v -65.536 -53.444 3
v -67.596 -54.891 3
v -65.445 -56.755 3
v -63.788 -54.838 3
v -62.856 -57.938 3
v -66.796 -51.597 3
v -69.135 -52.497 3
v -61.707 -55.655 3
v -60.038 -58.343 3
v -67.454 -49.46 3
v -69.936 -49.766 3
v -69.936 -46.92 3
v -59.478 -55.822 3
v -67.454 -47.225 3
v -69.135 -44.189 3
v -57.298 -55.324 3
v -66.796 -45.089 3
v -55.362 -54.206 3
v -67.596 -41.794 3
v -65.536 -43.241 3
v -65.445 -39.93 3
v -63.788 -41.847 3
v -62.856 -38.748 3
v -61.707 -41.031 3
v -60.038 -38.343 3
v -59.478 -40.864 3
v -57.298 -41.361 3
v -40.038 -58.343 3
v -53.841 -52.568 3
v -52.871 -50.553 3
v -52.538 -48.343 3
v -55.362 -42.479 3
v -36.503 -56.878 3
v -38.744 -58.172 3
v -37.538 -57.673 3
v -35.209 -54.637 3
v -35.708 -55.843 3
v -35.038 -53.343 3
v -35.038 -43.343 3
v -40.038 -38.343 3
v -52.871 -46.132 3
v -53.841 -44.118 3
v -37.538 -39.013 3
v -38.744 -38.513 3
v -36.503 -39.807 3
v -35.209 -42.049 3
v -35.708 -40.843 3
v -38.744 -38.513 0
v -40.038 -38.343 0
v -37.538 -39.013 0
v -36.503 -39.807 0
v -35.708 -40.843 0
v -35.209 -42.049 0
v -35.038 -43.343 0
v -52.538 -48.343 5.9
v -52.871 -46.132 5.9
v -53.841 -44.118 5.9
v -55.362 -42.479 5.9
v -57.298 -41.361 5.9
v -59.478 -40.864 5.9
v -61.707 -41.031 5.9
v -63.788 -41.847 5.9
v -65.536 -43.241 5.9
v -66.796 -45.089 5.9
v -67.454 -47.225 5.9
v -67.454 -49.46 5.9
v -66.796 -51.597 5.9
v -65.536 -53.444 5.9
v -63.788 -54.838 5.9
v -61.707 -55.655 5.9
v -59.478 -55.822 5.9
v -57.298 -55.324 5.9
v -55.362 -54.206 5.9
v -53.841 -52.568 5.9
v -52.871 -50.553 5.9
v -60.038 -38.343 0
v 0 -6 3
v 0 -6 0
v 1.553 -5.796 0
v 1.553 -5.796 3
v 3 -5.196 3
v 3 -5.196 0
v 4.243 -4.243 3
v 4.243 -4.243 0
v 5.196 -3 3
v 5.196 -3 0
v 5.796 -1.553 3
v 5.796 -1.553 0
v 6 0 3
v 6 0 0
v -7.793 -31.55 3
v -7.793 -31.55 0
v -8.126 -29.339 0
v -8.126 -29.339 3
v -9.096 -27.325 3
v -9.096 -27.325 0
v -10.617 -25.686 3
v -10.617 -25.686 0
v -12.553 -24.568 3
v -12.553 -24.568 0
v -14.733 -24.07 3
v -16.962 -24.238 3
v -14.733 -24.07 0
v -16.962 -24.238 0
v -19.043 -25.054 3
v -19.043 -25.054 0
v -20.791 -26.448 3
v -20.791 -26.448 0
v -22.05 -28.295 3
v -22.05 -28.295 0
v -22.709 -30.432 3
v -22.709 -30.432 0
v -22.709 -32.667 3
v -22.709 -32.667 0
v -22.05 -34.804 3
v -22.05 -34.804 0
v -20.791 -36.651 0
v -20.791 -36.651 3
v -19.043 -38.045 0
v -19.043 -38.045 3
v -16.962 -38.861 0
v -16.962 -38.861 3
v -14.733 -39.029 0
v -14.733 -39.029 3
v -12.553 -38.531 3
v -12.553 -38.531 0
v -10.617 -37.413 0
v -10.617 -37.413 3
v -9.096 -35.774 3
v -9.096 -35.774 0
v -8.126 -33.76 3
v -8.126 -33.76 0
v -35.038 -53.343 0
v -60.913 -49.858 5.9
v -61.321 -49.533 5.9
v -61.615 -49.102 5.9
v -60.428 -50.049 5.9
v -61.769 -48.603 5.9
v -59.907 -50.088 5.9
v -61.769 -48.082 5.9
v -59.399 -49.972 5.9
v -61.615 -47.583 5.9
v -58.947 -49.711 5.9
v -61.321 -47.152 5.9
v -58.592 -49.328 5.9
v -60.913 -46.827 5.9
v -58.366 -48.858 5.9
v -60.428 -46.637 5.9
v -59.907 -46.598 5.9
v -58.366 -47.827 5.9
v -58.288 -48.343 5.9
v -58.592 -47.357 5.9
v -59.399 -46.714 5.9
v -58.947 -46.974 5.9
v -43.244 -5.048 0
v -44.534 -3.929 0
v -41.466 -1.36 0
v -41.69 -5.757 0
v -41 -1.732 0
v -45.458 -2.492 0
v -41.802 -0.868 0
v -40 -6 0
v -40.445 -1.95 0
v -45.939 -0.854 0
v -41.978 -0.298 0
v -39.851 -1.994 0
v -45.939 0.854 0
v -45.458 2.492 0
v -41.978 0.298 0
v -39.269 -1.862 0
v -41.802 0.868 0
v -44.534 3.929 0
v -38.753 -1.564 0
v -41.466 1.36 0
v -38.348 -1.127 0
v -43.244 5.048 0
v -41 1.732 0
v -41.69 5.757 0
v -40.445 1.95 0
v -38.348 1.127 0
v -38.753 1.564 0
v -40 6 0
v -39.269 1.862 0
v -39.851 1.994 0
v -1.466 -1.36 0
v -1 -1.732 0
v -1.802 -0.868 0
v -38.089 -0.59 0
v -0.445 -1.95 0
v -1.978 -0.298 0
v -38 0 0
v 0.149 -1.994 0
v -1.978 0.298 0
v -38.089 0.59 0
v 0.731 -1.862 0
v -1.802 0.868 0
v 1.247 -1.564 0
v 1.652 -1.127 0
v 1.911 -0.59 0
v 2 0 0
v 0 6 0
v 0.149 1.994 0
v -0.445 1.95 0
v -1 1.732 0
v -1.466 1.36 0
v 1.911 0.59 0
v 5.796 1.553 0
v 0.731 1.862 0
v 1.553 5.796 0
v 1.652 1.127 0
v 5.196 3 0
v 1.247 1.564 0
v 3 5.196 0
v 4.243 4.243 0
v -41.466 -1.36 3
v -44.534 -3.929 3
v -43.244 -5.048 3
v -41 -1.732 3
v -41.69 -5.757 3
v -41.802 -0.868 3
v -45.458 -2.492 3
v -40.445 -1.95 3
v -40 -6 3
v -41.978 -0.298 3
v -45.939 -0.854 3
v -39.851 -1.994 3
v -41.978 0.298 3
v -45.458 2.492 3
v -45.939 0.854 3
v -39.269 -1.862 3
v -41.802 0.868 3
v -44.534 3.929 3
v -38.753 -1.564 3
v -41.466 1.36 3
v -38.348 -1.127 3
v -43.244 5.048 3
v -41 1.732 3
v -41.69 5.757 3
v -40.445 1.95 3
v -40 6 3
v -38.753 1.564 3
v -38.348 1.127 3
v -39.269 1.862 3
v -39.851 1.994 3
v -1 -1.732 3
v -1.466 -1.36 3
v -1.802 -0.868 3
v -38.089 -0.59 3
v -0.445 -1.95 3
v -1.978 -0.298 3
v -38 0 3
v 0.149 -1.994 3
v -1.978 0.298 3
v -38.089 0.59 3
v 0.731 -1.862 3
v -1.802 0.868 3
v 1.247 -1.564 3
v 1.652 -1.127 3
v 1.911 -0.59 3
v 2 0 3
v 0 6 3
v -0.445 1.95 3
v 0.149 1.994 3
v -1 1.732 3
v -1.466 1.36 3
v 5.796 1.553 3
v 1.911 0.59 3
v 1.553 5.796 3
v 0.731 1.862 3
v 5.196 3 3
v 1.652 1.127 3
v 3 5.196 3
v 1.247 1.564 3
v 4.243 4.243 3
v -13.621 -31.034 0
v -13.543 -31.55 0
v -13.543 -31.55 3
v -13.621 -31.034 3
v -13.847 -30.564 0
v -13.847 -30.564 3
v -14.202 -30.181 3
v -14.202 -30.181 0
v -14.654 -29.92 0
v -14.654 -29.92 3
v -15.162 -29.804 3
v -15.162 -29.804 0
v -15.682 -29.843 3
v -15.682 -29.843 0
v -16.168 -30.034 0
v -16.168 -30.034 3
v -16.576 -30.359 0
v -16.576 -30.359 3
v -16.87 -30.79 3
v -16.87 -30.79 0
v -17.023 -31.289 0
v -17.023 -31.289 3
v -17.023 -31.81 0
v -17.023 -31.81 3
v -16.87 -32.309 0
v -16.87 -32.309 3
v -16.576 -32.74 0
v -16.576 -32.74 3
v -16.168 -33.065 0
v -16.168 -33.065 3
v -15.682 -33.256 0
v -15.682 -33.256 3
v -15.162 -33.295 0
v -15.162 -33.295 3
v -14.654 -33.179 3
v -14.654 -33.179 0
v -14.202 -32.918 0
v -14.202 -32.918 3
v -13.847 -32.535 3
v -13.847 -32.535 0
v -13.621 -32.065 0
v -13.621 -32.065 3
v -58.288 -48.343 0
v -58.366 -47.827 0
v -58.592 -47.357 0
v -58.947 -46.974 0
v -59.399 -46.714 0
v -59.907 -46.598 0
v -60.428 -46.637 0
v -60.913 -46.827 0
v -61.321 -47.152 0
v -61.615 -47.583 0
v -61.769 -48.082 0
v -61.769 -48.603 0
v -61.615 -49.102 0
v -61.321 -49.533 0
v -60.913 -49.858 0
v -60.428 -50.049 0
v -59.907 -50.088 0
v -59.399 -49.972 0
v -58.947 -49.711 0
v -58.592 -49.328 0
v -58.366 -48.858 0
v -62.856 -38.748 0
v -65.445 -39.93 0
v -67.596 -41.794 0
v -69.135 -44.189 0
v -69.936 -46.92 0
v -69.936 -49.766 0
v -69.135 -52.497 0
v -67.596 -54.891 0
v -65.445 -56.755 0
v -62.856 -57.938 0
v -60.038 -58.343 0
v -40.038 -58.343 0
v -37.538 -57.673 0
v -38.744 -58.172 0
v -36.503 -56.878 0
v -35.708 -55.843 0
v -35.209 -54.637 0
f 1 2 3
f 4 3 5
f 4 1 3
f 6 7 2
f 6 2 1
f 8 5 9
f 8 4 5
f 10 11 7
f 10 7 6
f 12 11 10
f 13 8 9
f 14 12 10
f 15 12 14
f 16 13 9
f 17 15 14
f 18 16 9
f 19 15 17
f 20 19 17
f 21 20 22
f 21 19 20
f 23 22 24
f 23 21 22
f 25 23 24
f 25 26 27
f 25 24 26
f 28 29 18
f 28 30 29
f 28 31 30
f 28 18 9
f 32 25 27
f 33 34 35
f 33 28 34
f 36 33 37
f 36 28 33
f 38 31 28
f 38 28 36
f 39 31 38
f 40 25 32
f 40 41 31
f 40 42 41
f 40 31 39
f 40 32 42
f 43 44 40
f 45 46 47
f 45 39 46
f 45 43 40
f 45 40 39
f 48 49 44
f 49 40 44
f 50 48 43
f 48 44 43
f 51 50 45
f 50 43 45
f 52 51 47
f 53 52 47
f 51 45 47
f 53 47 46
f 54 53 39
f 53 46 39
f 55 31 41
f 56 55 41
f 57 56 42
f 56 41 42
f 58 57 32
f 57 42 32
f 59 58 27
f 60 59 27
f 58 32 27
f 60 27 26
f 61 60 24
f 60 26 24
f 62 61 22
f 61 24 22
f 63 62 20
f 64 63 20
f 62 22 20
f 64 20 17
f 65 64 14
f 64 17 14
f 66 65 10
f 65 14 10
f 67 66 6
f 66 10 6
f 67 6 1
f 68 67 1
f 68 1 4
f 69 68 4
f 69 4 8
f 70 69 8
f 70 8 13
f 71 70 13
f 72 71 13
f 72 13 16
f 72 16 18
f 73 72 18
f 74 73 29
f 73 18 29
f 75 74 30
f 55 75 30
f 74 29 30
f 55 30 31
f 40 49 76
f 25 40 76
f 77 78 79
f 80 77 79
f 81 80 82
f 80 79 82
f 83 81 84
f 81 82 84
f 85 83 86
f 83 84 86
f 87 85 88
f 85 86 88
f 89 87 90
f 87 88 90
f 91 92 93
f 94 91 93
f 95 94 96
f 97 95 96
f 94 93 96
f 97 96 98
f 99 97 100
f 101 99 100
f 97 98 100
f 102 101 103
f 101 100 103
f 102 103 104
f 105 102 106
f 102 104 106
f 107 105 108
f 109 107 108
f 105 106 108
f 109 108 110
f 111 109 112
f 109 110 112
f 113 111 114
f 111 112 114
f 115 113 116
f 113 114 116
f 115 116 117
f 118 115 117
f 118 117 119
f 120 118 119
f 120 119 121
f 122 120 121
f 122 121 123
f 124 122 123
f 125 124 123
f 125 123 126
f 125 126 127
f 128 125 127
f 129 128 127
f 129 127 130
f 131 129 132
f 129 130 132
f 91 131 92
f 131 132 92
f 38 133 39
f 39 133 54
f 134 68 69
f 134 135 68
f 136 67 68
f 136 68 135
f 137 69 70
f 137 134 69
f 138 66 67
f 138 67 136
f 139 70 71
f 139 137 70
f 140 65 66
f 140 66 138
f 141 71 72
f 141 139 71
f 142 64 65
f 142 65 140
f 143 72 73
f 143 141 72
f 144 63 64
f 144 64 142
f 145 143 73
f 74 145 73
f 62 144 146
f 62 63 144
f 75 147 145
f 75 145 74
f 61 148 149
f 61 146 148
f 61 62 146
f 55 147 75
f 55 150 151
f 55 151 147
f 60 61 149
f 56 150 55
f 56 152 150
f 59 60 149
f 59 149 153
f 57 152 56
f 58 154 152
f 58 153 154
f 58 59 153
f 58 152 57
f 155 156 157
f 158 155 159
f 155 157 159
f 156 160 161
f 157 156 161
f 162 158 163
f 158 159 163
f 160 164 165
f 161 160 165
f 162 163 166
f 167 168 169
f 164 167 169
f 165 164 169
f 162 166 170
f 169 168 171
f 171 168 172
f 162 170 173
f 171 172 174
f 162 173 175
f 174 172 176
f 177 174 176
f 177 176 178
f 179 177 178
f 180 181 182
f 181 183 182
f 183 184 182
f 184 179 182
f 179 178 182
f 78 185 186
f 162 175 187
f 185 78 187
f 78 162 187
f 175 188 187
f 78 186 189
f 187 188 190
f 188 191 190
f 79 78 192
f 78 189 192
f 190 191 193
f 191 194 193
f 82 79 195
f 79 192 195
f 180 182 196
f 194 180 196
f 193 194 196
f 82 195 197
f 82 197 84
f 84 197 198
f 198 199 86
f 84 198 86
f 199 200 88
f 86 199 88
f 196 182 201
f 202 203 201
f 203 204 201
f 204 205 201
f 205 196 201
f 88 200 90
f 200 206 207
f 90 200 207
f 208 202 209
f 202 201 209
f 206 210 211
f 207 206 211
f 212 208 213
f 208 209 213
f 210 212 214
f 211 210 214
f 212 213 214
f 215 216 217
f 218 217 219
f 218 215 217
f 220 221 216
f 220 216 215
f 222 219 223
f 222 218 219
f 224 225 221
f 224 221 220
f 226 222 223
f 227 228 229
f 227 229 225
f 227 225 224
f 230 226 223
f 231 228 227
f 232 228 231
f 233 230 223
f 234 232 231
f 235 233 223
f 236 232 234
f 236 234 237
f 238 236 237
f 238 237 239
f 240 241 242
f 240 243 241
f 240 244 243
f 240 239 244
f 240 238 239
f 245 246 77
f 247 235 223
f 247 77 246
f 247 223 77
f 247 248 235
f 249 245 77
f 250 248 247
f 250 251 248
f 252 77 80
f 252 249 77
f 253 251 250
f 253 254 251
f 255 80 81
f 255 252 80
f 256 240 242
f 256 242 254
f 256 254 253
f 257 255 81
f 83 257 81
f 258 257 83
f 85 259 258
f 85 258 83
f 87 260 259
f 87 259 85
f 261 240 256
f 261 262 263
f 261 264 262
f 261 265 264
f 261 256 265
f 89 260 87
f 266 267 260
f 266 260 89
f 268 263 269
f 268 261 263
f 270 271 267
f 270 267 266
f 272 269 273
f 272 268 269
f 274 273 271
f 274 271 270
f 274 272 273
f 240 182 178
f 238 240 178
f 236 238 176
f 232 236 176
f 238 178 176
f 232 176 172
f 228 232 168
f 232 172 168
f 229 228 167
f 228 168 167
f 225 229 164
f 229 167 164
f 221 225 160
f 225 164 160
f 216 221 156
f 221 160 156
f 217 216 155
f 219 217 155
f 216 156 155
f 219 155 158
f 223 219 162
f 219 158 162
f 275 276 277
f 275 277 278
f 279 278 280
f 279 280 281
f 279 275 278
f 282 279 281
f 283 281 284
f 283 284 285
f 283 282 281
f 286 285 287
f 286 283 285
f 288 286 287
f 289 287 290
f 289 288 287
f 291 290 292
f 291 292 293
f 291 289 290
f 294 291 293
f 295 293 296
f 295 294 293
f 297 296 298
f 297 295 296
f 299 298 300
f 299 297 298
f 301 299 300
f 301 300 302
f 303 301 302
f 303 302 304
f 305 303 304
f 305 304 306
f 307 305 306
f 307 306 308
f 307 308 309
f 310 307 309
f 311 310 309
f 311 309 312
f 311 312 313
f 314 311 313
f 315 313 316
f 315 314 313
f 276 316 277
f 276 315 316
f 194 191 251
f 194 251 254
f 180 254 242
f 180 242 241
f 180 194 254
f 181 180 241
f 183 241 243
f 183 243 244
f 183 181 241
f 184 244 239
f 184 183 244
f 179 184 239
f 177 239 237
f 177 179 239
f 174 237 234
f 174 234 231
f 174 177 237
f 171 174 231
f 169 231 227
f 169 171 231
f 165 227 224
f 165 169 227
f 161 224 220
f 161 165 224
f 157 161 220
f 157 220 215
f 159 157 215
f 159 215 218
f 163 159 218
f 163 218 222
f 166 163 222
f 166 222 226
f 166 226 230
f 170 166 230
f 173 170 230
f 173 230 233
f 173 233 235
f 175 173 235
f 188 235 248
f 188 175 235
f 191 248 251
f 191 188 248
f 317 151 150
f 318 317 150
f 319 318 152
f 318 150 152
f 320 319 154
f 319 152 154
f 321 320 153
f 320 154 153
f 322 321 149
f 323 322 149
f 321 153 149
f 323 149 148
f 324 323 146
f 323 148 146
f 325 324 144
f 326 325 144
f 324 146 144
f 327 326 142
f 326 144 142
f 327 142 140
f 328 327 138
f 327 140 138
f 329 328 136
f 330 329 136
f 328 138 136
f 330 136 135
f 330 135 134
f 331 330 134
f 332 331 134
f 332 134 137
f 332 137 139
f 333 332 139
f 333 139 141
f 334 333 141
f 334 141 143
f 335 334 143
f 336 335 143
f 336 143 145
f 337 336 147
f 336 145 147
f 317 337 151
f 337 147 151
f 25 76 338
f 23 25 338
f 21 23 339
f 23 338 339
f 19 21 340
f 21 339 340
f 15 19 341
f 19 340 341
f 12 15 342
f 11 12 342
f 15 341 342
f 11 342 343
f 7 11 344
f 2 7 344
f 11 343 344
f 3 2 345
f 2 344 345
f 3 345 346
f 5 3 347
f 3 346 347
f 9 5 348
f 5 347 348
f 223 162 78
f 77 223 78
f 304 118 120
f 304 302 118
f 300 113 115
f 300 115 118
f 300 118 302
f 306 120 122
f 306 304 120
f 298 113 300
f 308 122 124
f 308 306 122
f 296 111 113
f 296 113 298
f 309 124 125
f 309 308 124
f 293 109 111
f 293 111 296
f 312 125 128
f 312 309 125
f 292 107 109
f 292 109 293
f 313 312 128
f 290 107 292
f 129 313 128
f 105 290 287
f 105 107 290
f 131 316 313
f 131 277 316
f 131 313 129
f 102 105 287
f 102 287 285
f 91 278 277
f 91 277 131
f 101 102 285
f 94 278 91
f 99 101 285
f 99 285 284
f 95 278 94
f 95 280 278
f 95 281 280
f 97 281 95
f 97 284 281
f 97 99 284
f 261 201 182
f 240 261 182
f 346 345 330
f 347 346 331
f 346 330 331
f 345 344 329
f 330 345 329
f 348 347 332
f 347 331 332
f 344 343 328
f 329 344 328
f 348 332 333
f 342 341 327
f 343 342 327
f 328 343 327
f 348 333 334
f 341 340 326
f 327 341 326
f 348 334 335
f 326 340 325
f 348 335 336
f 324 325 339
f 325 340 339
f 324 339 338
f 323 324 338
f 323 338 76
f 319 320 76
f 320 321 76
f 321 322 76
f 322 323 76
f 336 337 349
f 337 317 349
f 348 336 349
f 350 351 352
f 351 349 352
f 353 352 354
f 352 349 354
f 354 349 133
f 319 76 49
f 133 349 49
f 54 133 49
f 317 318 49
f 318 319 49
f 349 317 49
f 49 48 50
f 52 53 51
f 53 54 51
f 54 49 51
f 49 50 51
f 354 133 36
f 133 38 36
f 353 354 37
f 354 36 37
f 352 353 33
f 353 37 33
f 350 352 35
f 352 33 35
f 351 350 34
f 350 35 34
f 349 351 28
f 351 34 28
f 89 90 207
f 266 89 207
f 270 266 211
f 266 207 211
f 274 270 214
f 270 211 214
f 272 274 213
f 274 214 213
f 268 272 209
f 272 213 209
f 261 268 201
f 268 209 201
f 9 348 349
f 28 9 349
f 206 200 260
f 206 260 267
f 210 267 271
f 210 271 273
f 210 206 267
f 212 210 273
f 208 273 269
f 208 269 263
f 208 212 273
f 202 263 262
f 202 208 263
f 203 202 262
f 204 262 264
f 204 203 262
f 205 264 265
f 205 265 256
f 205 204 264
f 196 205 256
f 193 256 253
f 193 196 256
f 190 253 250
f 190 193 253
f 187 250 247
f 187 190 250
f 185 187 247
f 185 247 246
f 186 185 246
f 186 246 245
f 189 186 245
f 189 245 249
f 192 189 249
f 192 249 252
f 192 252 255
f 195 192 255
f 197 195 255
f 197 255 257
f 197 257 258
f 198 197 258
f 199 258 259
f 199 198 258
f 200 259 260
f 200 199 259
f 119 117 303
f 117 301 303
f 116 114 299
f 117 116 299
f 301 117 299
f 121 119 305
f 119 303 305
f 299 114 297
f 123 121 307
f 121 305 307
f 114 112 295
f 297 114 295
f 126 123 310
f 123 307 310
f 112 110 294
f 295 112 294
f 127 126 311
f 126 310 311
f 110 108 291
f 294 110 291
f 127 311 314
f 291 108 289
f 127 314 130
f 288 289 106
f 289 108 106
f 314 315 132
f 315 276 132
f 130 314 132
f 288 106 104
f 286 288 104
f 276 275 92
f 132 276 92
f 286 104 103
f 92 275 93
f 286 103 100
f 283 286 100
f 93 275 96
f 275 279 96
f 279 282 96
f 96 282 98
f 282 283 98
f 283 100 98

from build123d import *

# Parameters (mm, degrees)
F0_R     = 2
F1_DEPTH = 3
F3_DEPTH = 3
F4_R     = 7.5
F5_DEPTH = 2.9
F6_R     = 1.75
F7_DEPTH = 5.9
F8_R     = 7.5
F8_R_2   = 1.75
F9_DEPTH = 3
F10_R    = 5


with BuildPart() as f1:
    # F0 (on Top) → F1 (new body)
    with BuildSketch(Plane.XY):
        with BuildLine():
            ThreePointArc((0, -6), (4.2426406871, -4.2426406871), (6, 0))
            ThreePointArc((6, 0), (4.2426406871, 4.2426406871), (0, 6))
            ThreePointArc((0, 6), (-6, 0), (0, -6))
        make_face()
        Circle(F0_R, mode=Mode.SUBTRACT)
        with BuildLine():
            ThreePointArc((0, -6), (-6, 0), (0, 6))
            Line((0, 6), (-40, 6))
            ThreePointArc((-40, 6), (-35.7573593129, 4.2426406871), (-34, 0))
            ThreePointArc((-34, 0), (-35.7573593129, -4.2426406871), (-40, -6))
            Line((-40, -6), (0, -6))
        make_face()
        with BuildLine():
            ThreePointArc((-34, 0), (-35.7573593129, 4.2426406871), (-40, 6))
            ThreePointArc((-40, 6), (-46, 0), (-40, -6))
            ThreePointArc((-40, -6), (-35.7573593129, -4.2426406871), (-34, 0))
        make_face()
        with Locations((-40, 0)):
            Circle(F0_R, mode=Mode.SUBTRACT)
    extrude(amount=F1_DEPTH)


with BuildPart() as f3:
    # F2 (on Top) → F3 (new body)
    with BuildSketch(Plane.XY):
        with BuildLine():
            Line((-35.0382344763, -38.3426717669), (-60.0382344763, -38.3426717669))
            ThreePointArc((-60.0382344763, -38.3426717669), (-70.0382344763, -48.3426717669), (-60.0382344763, -58.3426717669))
            Line((-60.0382344763, -58.3426717669), (-35.0382344763, -58.3426717669))
            Line((-35.0382344763, -58.3426717669), (-35.0382344763, -38.3426717669))
        make_face()
    extrude(amount=F3_DEPTH)

    # F4 (on face) → F5 (join)
    with BuildSketch(Plane.XY.offset(3)):
        with Locations((-60.0382344763, -48.3426717669)):
            Circle(F4_R)
    extrude(amount=F5_DEPTH)

    # F6 (on face) → F7 (cut, through all)
    with BuildSketch(Plane.XY.offset(5.9)):
        with Locations((-60.0382344763, -48.3426717669)):
            Circle(F6_R)
    extrude(amount=-F7_DEPTH, mode=Mode.SUBTRACT)

    # F10
    f10_edges = [f3.edges().sort_by_distance(p)[0] for p in [
        (-35.038234, -38.342672, 1.5),
        (-35.038234, -58.342672, 1.5),
    ]]
    fillet(f10_edges, radius=F10_R)


with BuildPart() as f9:
    # F8 (on Top) → F9 (new body)
    with BuildSketch(Plane.XY):
        with Locations((-15.2930086479, -31.5495021641)):
            Circle(F8_R)
        with Locations((-15.2930086479, -31.5495021641)):
            Circle(F8_R_2, mode=Mode.SUBTRACT)
    extrude(amount=F9_DEPTH)


solid = Compound([f1.part, f3.part, f9.part])
